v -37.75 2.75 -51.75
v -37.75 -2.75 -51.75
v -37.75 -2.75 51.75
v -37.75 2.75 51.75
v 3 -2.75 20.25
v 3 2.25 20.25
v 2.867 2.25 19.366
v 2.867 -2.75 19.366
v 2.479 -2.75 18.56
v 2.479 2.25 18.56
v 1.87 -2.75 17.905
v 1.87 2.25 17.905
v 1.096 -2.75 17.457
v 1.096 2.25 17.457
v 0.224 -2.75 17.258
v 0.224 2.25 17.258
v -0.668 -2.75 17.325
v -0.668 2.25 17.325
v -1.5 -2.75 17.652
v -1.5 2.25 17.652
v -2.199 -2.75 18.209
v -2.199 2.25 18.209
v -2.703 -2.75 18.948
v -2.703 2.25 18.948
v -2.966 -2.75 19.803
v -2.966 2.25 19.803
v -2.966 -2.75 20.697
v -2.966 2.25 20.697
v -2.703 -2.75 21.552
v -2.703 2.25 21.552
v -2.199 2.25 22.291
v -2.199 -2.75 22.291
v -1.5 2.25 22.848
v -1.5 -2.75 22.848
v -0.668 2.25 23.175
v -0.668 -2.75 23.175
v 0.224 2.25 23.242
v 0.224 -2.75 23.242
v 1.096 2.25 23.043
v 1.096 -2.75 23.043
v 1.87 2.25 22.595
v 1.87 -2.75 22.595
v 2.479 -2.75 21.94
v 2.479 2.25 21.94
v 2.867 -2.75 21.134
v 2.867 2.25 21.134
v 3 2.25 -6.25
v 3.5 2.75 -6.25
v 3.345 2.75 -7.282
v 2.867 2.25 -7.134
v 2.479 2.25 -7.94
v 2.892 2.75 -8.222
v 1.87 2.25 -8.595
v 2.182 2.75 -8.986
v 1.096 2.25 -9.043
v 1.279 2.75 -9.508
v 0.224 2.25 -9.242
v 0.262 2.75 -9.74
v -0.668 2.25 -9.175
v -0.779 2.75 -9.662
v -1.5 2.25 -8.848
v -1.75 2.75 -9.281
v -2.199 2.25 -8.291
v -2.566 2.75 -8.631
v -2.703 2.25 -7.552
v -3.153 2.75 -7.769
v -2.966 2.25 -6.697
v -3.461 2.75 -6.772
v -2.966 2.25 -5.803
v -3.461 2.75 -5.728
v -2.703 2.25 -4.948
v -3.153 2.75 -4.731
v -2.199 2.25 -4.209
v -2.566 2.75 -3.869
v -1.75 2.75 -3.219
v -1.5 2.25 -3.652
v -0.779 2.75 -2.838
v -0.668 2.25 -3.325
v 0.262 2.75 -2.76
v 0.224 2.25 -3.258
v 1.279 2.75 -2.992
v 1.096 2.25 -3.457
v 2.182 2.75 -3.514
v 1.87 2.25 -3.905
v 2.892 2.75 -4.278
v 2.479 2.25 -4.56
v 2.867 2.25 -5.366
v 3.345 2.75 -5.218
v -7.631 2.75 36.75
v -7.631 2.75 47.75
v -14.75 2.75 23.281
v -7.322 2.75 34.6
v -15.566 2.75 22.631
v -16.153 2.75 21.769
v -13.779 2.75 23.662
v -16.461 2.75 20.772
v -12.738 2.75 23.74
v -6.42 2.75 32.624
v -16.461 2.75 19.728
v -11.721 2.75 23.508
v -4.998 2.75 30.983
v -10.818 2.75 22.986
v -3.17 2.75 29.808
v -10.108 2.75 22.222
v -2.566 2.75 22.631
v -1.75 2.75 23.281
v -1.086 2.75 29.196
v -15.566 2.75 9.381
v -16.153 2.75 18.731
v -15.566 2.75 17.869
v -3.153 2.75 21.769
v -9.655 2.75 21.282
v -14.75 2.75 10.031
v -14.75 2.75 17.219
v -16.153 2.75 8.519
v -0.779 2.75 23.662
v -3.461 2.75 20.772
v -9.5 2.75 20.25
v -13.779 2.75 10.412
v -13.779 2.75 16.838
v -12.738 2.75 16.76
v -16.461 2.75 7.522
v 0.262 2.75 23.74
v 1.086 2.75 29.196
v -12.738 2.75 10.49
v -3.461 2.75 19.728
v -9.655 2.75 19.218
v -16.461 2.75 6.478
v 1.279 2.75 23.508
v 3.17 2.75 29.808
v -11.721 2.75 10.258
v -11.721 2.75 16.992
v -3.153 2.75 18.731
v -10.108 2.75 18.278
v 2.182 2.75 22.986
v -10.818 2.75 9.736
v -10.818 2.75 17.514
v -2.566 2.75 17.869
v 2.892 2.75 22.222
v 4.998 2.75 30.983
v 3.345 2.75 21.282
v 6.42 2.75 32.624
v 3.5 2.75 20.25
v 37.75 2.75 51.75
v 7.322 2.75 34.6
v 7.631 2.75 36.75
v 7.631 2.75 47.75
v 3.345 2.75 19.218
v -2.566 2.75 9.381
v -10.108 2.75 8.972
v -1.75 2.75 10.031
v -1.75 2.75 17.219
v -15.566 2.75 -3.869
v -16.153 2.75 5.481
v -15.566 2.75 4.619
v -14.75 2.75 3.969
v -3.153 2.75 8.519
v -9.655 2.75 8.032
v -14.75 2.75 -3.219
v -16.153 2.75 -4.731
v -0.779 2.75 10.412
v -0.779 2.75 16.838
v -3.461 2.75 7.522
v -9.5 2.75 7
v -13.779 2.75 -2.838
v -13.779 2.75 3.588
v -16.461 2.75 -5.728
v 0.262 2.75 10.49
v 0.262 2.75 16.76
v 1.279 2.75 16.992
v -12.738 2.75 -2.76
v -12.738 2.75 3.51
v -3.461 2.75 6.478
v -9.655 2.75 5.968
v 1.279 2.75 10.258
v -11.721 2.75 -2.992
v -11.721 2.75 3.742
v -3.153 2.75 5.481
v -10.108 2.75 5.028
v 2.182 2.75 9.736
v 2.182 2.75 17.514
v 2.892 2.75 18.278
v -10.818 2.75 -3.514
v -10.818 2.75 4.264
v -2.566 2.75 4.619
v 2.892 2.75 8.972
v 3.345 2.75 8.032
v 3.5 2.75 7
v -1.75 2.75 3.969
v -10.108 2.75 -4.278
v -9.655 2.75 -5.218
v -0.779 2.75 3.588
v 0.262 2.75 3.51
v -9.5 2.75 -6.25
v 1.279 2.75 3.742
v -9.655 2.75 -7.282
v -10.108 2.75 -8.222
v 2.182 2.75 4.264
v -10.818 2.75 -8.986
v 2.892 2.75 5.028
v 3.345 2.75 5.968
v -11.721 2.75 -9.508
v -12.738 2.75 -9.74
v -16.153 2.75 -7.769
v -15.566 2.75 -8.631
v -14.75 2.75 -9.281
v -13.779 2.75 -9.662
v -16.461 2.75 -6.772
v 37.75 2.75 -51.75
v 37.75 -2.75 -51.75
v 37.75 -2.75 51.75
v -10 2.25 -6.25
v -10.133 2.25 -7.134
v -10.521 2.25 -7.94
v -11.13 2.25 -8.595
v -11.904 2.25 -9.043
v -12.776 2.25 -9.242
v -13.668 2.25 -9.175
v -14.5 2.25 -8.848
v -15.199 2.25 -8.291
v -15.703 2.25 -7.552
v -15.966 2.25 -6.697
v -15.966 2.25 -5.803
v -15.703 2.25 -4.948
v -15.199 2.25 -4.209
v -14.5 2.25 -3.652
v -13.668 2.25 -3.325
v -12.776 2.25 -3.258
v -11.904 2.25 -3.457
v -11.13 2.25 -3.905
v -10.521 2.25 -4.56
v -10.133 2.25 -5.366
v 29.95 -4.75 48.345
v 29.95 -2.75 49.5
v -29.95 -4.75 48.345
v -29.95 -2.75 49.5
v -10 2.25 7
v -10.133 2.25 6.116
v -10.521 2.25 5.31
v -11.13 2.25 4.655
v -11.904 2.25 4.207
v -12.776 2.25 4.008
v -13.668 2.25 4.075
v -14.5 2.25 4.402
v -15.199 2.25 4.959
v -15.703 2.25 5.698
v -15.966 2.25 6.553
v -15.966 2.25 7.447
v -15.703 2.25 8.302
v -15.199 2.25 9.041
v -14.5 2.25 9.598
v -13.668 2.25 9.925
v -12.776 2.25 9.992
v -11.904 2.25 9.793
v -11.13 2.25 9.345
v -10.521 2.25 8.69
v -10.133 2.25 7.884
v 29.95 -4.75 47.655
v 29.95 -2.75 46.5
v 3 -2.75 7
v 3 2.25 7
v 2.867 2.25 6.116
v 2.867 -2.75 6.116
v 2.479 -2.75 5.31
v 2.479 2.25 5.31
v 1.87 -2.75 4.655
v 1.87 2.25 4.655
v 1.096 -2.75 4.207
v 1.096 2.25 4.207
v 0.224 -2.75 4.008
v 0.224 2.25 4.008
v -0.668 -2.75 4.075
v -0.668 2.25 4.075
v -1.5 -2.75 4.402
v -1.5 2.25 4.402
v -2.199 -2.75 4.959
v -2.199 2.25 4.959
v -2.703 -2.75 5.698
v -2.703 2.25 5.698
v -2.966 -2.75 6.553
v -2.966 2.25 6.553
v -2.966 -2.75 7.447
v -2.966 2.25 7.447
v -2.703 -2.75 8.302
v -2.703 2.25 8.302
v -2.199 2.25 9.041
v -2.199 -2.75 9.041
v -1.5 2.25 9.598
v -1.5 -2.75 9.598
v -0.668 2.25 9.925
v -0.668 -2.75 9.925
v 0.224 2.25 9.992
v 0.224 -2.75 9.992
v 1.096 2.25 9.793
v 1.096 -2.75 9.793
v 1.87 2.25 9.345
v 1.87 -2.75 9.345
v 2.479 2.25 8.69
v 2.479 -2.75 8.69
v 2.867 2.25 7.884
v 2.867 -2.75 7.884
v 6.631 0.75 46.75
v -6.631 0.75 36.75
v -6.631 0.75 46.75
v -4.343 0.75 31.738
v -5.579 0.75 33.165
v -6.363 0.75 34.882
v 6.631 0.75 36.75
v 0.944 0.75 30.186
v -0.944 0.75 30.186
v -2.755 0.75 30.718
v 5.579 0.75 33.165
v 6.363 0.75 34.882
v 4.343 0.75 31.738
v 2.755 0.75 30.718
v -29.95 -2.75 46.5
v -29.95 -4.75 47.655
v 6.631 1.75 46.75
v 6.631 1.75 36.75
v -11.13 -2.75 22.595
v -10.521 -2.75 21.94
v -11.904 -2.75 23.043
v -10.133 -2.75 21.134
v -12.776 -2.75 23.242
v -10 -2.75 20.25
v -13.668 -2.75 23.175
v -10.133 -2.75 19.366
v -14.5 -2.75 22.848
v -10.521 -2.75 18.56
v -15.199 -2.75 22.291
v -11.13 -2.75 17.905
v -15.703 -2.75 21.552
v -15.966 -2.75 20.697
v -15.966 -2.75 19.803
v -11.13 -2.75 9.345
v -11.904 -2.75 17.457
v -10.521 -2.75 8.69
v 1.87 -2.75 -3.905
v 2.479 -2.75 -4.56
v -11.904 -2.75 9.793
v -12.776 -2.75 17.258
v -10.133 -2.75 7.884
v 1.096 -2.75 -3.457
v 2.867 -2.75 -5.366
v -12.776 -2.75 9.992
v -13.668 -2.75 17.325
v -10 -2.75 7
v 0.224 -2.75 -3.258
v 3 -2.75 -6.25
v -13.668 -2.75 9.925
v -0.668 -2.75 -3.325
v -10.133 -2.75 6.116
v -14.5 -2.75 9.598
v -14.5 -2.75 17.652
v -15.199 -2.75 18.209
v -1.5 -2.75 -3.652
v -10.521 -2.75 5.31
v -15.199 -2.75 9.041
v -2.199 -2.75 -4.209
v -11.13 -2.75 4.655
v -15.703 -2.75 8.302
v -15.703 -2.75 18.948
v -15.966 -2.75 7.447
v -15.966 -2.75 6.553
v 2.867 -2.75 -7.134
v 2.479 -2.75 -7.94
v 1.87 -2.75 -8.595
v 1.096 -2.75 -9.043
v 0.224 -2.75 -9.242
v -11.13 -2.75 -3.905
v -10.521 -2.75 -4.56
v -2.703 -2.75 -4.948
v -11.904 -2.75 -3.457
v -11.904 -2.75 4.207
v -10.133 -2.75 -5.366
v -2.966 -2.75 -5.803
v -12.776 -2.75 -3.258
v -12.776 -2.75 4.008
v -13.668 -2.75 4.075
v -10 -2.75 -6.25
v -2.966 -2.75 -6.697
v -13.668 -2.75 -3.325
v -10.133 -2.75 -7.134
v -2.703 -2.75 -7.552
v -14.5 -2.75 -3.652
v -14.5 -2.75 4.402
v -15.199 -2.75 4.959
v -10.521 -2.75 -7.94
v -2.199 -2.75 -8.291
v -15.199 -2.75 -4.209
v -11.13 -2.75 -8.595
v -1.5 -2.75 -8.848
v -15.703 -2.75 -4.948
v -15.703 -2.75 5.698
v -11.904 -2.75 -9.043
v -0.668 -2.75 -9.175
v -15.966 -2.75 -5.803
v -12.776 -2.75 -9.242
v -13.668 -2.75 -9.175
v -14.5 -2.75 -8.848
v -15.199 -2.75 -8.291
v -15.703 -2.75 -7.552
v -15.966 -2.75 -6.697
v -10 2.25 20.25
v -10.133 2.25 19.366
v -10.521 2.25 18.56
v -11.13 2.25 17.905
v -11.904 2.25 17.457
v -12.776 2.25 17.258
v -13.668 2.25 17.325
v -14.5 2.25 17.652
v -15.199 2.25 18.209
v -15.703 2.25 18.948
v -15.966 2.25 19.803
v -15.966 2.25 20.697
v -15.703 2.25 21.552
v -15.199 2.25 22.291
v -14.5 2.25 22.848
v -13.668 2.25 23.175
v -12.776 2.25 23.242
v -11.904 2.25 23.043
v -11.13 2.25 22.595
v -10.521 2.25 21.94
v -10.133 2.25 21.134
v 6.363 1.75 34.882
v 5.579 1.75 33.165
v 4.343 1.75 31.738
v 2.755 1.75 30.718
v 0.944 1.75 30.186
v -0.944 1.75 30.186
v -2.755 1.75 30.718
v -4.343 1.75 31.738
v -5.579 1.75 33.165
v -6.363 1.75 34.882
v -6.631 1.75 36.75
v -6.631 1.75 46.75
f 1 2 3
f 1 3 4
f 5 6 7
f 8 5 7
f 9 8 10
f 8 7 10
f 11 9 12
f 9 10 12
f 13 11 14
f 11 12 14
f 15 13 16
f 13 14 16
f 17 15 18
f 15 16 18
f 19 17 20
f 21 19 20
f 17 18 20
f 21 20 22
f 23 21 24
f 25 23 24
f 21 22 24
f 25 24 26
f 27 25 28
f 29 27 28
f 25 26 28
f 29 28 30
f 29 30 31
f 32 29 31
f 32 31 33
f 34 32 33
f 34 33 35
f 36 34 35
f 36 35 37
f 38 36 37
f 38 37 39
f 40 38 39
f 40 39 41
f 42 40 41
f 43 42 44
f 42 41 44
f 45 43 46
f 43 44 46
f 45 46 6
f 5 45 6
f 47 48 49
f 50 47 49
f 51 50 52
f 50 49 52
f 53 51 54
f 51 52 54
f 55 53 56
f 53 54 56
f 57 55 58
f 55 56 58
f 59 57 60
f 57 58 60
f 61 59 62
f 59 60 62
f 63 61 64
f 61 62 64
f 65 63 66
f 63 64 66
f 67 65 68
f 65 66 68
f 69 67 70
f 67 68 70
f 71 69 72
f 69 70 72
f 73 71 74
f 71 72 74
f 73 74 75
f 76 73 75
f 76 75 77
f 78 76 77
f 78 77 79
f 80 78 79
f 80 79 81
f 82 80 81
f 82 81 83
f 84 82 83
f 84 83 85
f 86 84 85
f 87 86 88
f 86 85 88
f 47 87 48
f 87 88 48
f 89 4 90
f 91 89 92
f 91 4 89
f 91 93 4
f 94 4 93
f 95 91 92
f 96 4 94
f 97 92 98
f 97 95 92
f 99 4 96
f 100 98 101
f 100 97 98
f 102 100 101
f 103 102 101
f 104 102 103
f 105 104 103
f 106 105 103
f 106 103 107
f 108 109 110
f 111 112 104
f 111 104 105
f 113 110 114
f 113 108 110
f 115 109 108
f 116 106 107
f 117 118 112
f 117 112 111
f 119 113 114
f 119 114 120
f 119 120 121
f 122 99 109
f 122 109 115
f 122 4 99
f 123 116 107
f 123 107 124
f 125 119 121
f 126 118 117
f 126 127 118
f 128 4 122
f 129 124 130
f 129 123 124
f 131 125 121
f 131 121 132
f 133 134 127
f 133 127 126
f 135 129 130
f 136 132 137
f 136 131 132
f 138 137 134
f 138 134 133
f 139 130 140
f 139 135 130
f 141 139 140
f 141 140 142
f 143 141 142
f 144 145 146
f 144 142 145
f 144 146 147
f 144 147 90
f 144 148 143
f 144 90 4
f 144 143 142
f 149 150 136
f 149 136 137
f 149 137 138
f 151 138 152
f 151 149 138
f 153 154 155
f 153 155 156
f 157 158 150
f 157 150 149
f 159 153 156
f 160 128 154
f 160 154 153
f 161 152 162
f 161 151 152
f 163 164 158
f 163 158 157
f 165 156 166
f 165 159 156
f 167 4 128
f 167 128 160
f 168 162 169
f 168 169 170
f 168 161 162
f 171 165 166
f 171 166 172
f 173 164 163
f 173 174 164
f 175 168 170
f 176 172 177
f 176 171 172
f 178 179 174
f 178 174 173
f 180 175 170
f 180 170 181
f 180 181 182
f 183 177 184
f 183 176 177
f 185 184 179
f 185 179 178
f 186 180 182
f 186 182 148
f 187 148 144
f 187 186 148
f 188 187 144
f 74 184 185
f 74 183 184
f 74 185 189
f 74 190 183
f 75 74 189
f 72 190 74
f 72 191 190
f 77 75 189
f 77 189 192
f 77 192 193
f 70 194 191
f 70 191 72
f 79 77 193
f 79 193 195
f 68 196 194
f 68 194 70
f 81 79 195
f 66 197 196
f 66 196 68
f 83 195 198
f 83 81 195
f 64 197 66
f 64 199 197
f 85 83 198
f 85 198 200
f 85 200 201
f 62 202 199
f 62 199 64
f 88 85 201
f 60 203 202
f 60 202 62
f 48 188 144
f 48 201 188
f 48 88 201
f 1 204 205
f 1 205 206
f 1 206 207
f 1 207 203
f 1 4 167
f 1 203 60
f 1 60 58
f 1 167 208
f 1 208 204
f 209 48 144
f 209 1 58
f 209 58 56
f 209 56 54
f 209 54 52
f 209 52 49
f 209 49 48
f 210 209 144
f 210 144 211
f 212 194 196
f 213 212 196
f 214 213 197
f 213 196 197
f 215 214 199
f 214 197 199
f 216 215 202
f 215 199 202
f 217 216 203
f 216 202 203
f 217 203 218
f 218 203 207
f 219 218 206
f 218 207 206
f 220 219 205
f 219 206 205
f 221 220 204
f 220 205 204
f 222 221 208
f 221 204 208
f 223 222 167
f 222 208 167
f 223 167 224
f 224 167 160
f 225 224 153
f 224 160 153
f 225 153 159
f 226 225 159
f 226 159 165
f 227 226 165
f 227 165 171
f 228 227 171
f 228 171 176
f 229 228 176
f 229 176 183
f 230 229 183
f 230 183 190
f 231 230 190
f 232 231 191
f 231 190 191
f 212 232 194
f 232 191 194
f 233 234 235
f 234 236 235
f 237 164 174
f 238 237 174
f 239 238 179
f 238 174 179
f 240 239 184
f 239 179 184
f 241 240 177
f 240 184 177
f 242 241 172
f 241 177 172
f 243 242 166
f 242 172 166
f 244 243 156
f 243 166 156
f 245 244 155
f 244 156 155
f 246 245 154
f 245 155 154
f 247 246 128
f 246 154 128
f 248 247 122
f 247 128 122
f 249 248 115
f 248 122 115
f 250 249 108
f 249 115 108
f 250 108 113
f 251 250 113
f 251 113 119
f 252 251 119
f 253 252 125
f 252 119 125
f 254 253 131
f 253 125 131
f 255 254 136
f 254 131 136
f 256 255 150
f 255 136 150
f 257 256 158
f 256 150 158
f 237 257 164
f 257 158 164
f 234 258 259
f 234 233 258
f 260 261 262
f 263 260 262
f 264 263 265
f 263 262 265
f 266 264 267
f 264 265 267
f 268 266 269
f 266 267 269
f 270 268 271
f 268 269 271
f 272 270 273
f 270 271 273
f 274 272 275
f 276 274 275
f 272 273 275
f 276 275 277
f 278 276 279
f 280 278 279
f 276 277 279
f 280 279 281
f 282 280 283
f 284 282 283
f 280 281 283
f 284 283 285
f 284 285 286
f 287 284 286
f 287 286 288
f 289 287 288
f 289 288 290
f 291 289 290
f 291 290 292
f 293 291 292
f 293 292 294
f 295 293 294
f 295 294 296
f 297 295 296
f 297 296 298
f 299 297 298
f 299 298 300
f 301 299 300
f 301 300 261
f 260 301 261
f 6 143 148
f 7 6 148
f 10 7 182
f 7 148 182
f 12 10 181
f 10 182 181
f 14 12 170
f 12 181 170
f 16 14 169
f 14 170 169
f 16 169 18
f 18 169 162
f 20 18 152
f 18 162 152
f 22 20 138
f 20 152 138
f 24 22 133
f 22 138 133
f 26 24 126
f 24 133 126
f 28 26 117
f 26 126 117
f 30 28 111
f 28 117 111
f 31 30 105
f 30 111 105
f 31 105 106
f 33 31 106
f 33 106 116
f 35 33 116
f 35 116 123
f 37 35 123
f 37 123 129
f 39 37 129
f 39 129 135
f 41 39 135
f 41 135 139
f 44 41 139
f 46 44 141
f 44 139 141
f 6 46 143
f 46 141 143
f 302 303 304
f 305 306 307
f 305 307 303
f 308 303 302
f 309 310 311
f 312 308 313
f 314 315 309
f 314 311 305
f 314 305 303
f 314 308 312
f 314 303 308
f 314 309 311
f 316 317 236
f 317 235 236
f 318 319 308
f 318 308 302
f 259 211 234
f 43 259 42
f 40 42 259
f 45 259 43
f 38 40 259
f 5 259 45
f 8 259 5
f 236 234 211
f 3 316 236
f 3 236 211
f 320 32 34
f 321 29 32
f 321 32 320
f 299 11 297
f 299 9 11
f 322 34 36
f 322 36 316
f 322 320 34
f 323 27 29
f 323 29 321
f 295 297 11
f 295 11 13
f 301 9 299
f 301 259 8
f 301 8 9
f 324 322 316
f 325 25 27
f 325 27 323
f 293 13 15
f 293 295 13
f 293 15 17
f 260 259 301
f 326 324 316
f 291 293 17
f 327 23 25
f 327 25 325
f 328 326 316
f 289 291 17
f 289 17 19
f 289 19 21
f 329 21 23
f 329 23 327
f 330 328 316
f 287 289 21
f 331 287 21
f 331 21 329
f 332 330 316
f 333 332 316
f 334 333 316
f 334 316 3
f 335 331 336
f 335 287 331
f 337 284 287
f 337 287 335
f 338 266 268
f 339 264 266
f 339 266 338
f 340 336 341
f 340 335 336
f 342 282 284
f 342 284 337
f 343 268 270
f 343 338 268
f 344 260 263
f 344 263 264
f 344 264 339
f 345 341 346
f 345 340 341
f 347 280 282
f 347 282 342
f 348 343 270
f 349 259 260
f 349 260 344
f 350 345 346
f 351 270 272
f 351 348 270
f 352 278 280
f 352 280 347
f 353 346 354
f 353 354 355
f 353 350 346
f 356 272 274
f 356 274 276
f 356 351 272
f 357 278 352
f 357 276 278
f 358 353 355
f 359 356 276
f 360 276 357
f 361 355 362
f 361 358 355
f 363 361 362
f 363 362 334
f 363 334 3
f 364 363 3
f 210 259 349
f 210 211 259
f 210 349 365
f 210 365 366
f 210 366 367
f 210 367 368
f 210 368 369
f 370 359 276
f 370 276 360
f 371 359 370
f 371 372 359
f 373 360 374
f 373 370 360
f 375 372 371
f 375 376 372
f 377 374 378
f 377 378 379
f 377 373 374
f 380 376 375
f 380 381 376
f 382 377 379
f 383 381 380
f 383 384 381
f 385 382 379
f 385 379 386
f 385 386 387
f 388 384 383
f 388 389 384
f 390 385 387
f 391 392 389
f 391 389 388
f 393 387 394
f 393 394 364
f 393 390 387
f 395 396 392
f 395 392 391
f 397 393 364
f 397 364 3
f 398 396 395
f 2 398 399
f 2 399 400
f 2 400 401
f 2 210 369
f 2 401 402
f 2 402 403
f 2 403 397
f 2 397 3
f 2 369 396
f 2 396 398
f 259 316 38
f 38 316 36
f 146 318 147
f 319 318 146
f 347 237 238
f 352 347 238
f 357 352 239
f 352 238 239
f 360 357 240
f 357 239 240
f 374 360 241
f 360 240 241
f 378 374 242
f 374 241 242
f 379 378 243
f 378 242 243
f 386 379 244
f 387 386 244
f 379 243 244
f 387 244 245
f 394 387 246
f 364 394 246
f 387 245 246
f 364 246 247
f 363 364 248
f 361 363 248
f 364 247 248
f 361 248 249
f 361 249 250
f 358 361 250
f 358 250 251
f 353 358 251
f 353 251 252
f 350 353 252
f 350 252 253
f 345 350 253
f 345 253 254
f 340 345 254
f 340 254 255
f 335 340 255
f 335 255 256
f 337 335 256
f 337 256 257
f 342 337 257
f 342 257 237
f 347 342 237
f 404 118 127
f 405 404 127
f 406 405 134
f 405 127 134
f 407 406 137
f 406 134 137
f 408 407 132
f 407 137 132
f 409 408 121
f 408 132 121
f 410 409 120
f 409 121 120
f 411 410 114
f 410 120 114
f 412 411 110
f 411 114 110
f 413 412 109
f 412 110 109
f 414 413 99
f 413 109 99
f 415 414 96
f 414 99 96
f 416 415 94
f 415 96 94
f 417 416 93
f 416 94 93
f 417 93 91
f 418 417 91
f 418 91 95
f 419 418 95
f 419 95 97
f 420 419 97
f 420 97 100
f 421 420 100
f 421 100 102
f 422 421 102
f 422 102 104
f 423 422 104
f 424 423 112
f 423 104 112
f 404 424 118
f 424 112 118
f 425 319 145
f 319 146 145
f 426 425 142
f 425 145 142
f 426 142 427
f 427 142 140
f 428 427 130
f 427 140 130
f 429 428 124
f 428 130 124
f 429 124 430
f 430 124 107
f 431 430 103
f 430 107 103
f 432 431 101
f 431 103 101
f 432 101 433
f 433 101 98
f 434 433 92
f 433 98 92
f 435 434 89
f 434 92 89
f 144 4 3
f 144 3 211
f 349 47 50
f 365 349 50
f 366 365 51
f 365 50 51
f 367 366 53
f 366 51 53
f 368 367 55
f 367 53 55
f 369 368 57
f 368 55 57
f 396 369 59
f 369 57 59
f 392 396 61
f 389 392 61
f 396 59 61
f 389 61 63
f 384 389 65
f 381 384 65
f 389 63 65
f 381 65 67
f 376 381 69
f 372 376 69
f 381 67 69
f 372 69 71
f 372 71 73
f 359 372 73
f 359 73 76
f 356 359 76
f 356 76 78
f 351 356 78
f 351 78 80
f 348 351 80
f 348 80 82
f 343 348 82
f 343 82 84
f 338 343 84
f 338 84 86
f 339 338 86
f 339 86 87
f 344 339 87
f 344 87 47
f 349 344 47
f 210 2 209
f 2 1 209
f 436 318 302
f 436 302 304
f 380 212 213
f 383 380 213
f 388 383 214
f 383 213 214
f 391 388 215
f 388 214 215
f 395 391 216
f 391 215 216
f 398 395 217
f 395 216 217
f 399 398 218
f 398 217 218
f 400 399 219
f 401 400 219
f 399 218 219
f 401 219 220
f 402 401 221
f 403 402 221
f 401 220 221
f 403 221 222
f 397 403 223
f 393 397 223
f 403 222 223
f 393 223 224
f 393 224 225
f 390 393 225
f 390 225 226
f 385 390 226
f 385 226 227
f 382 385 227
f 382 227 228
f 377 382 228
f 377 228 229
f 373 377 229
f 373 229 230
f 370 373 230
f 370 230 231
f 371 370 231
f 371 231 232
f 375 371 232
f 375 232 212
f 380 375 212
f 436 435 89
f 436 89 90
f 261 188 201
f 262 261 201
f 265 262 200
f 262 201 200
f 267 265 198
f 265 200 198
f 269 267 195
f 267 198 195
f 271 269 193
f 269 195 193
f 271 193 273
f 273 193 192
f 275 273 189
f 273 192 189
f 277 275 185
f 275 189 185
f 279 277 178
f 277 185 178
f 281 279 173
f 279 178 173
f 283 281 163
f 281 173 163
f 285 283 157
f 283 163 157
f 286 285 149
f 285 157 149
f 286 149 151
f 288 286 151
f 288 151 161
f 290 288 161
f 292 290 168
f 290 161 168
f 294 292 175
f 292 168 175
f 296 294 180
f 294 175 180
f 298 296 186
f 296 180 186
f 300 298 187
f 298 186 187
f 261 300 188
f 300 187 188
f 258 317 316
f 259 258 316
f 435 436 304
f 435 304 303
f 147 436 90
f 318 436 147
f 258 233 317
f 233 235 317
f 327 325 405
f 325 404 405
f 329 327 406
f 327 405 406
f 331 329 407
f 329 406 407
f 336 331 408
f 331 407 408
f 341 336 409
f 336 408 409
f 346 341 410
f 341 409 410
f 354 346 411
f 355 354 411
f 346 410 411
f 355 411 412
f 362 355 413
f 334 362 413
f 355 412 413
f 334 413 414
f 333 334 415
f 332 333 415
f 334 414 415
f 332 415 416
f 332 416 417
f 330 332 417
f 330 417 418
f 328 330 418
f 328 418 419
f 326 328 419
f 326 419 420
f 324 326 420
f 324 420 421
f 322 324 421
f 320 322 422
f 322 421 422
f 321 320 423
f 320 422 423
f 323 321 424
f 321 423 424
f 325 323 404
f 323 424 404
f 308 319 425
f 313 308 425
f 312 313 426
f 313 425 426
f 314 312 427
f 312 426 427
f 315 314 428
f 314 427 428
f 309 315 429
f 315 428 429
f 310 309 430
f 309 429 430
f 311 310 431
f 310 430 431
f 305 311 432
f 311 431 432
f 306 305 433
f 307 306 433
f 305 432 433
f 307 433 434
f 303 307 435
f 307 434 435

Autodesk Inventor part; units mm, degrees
ref_plane "XZ Plane" through (0, 0, 0) normal (0, 1, 0) x (-1, 0, 0)
ref_plane "XY Plane" through (0, 0, 0) normal (0, 0, 1) x (1, 0, 0)
sketch "Sketch1" plane through (0, 0, 0) normal (0, 0, 1) x (1, 0, 0)
  line L0 (-37.75, 2.75) -> (37.75, 2.75)
  line L1 (37.75, 2.75) -> (37.75, -2.75)
  line L2 (37.75, -2.75) -> (-37.75, -2.75)
  line L3 (-37.75, -2.75) -> (-37.75, 2.75)
  point P0 (0, 0)
  point P1 (0, 2.75)
  point P2 (-37.75, 0)
  dimension "d0" = 5.5
  dimension "d1" = 75.5
extrude "Extrusion1" add sketch "Sketch1" along normal mid plane 103.5
ref_plane "Work Plane1" through (0, 0, 0) normal (1, 0, 0) x (0, 1, 0)
sketch "Sketch6" plane through (0, 0, 0) normal (1, 0, 0) x (0, 1, 0)
  line L0 (-2.75, 51.75) -> (-2.75, -51.75) projected
  line L1 (-2.75, 49.5) -> (-4.75, 48.3453)
  line L2 (-4.75, 48.3453) -> (-4.75, 47.6547)
  line L3 (-4.75, 47.6547) -> (-2.75, 46.5)
  line L4 (-2.75, 46.5) -> (-2.75, 49.5)
  point P0 (0, 0)
  point P1 (-2.75, 48)
  point P2 (-4.75, 48)
  dimension "d17" = 2.25
  dimension "d18" = 3
  dimension "d19" = 2
  dimension "d20" = 60
extrude "Extrusion4" add sketch "Sketch6" along normal mid plane 59.9
sketch "Sketch7" plane through (-37.75, 2.75, 51.75) normal (0, 1, 0) x (1, 0, 0)
  line L0 (75.5, 0) -> (0, 0) projected
  line L1 (44.3814, 15) -> (44.3814, 5)
  line L2 (44.3814, 5) -> (31.1186, 5)
  line L3 (31.1186, 5) -> (31.1186, 15)
  arc A0 (44.3814, 15) -> (31.1186, 15) centre (37.75, 15) ccw
  point P0 (37.75, 51.75)
  point P1 (37.75, 5)
  point P2 (37.75, 0)
  point P3 (37.75, 0)
  dimension "d23" = 5
  dimension "d25" = 10
  dimension "d26" = 6.6314
extrude "Extrusion5" cut sketch "Sketch7" against normal blind 2
chamfer "Chamfer2" distance 1 angle 45 4 edges at (0, 2.75, 30.1186) (6.6314, 2.75, 41.75) (-6.6314, 2.75, 41.75) (0, 2.75, 46.75)
sketch "Sketch8" plane through (-37.75, 2.75, 51.75) normal (0, 1, 0) x (1, 0, 0)
  line L0 (0, 103.5) -> (75.5, 103.5) projected
  line L1 (3, 100.5) -> (72.5, 100.5)
  line L2 (72.5, 100.5) -> (72.5, 6)
  line L3 (72.5, 6) -> (3, 6)
  line L4 (3, 6) -> (3, 100.5)
  line L5 (0, 103.5) -> (0, 0) projected
  line L6 (75.5, 0) -> (0, 0) projected
  line L7 (9.25, 96.25) -> (66.25, 96.25)
  line L8 (66.25, 96.25) -> (66.25, 10.25)
  line L9 (66.25, 10.25) -> (9.25, 10.25)
  line L10 (9.25, 10.25) -> (9.25, 96.25)
  line L11 (18.25, 71.25) -> (44.25, 71.25)
  line L12 (44.25, 71.25) -> (44.25, 18.25)
  line L13 (44.25, 18.25) -> (18.25, 18.25)
  line L14 (18.25, 18.25) -> (18.25, 71.25)
  line L15 (18.25, 44.75) -> (44.25, 44.75)
  line L16 (18.25, 58) -> (44.25, 58)
  line L17 (18.25, 31.5) -> (44.25, 31.5)
  circle A0 centre (24.75, 58) radius 3
  circle A1 centre (24.75, 44.75) radius 3
  circle A2 centre (24.75, 31.5) radius 3
  circle A3 centre (37.75, 58) radius 3
  circle A4 centre (37.75, 44.75) radius 3
  circle A5 centre (37.75, 31.5) radius 3
  point P0 (37.75, 51.75)
  point P1 (37.75, 100.5)
  point P2 (37.75, 103.5)
  point P3 (37.75, 96.25)
  point P4 (3, 53.25)
  point P5 (9.25, 53.25)
  point P6 (31.25, 31.5)
  dimension "d32" = 3
  dimension "d33" = 3
  dimension "d34" = 6
  dimension "d35" = 57
  dimension "d36" = 86
  dimension "d37" = 8
  dimension "d38" = 53
  dimension "d39" = 26
  dimension "d40" = 22
  dimension "d44" = 6.5
  dimension "d45" = 6.5
  dimension "d46" = 6.5
  dimension "d47" = 6.5
  dimension "d48" = 6.5
  dimension "d49" = 6.5
  dimension "d50" = 6
  dimension "d51" = 6
  dimension "d52" = 6
  dimension "d53" = 6
  dimension "d54" = 6
  dimension "d55" = 6
  dimension "d56" = 13.25
  dimension "d57" = 26.5
  dimension "d58" = 13.25
extrude "Extrusion6" cut sketch "Sketch8" against normal up to surface (5.5 mm away) contours A0 L16 | L16 A0 | A3 L16 | L16 A3 | A1 L15 | L15 A1 | A4 L15 | L15 A4 | A2 L17 | L17 A2 | A5 L17 | L17 A5
chamfer "Chamfer3" distance 0.5 angle 45 6 edges at (-16, 2.75, -6.25) (-16, 2.75, 7) (-16, 2.75, 20.25) (-3, 2.75, 20.25) (-3, 2.75, 7) (-3, 2.75, -6.25)
